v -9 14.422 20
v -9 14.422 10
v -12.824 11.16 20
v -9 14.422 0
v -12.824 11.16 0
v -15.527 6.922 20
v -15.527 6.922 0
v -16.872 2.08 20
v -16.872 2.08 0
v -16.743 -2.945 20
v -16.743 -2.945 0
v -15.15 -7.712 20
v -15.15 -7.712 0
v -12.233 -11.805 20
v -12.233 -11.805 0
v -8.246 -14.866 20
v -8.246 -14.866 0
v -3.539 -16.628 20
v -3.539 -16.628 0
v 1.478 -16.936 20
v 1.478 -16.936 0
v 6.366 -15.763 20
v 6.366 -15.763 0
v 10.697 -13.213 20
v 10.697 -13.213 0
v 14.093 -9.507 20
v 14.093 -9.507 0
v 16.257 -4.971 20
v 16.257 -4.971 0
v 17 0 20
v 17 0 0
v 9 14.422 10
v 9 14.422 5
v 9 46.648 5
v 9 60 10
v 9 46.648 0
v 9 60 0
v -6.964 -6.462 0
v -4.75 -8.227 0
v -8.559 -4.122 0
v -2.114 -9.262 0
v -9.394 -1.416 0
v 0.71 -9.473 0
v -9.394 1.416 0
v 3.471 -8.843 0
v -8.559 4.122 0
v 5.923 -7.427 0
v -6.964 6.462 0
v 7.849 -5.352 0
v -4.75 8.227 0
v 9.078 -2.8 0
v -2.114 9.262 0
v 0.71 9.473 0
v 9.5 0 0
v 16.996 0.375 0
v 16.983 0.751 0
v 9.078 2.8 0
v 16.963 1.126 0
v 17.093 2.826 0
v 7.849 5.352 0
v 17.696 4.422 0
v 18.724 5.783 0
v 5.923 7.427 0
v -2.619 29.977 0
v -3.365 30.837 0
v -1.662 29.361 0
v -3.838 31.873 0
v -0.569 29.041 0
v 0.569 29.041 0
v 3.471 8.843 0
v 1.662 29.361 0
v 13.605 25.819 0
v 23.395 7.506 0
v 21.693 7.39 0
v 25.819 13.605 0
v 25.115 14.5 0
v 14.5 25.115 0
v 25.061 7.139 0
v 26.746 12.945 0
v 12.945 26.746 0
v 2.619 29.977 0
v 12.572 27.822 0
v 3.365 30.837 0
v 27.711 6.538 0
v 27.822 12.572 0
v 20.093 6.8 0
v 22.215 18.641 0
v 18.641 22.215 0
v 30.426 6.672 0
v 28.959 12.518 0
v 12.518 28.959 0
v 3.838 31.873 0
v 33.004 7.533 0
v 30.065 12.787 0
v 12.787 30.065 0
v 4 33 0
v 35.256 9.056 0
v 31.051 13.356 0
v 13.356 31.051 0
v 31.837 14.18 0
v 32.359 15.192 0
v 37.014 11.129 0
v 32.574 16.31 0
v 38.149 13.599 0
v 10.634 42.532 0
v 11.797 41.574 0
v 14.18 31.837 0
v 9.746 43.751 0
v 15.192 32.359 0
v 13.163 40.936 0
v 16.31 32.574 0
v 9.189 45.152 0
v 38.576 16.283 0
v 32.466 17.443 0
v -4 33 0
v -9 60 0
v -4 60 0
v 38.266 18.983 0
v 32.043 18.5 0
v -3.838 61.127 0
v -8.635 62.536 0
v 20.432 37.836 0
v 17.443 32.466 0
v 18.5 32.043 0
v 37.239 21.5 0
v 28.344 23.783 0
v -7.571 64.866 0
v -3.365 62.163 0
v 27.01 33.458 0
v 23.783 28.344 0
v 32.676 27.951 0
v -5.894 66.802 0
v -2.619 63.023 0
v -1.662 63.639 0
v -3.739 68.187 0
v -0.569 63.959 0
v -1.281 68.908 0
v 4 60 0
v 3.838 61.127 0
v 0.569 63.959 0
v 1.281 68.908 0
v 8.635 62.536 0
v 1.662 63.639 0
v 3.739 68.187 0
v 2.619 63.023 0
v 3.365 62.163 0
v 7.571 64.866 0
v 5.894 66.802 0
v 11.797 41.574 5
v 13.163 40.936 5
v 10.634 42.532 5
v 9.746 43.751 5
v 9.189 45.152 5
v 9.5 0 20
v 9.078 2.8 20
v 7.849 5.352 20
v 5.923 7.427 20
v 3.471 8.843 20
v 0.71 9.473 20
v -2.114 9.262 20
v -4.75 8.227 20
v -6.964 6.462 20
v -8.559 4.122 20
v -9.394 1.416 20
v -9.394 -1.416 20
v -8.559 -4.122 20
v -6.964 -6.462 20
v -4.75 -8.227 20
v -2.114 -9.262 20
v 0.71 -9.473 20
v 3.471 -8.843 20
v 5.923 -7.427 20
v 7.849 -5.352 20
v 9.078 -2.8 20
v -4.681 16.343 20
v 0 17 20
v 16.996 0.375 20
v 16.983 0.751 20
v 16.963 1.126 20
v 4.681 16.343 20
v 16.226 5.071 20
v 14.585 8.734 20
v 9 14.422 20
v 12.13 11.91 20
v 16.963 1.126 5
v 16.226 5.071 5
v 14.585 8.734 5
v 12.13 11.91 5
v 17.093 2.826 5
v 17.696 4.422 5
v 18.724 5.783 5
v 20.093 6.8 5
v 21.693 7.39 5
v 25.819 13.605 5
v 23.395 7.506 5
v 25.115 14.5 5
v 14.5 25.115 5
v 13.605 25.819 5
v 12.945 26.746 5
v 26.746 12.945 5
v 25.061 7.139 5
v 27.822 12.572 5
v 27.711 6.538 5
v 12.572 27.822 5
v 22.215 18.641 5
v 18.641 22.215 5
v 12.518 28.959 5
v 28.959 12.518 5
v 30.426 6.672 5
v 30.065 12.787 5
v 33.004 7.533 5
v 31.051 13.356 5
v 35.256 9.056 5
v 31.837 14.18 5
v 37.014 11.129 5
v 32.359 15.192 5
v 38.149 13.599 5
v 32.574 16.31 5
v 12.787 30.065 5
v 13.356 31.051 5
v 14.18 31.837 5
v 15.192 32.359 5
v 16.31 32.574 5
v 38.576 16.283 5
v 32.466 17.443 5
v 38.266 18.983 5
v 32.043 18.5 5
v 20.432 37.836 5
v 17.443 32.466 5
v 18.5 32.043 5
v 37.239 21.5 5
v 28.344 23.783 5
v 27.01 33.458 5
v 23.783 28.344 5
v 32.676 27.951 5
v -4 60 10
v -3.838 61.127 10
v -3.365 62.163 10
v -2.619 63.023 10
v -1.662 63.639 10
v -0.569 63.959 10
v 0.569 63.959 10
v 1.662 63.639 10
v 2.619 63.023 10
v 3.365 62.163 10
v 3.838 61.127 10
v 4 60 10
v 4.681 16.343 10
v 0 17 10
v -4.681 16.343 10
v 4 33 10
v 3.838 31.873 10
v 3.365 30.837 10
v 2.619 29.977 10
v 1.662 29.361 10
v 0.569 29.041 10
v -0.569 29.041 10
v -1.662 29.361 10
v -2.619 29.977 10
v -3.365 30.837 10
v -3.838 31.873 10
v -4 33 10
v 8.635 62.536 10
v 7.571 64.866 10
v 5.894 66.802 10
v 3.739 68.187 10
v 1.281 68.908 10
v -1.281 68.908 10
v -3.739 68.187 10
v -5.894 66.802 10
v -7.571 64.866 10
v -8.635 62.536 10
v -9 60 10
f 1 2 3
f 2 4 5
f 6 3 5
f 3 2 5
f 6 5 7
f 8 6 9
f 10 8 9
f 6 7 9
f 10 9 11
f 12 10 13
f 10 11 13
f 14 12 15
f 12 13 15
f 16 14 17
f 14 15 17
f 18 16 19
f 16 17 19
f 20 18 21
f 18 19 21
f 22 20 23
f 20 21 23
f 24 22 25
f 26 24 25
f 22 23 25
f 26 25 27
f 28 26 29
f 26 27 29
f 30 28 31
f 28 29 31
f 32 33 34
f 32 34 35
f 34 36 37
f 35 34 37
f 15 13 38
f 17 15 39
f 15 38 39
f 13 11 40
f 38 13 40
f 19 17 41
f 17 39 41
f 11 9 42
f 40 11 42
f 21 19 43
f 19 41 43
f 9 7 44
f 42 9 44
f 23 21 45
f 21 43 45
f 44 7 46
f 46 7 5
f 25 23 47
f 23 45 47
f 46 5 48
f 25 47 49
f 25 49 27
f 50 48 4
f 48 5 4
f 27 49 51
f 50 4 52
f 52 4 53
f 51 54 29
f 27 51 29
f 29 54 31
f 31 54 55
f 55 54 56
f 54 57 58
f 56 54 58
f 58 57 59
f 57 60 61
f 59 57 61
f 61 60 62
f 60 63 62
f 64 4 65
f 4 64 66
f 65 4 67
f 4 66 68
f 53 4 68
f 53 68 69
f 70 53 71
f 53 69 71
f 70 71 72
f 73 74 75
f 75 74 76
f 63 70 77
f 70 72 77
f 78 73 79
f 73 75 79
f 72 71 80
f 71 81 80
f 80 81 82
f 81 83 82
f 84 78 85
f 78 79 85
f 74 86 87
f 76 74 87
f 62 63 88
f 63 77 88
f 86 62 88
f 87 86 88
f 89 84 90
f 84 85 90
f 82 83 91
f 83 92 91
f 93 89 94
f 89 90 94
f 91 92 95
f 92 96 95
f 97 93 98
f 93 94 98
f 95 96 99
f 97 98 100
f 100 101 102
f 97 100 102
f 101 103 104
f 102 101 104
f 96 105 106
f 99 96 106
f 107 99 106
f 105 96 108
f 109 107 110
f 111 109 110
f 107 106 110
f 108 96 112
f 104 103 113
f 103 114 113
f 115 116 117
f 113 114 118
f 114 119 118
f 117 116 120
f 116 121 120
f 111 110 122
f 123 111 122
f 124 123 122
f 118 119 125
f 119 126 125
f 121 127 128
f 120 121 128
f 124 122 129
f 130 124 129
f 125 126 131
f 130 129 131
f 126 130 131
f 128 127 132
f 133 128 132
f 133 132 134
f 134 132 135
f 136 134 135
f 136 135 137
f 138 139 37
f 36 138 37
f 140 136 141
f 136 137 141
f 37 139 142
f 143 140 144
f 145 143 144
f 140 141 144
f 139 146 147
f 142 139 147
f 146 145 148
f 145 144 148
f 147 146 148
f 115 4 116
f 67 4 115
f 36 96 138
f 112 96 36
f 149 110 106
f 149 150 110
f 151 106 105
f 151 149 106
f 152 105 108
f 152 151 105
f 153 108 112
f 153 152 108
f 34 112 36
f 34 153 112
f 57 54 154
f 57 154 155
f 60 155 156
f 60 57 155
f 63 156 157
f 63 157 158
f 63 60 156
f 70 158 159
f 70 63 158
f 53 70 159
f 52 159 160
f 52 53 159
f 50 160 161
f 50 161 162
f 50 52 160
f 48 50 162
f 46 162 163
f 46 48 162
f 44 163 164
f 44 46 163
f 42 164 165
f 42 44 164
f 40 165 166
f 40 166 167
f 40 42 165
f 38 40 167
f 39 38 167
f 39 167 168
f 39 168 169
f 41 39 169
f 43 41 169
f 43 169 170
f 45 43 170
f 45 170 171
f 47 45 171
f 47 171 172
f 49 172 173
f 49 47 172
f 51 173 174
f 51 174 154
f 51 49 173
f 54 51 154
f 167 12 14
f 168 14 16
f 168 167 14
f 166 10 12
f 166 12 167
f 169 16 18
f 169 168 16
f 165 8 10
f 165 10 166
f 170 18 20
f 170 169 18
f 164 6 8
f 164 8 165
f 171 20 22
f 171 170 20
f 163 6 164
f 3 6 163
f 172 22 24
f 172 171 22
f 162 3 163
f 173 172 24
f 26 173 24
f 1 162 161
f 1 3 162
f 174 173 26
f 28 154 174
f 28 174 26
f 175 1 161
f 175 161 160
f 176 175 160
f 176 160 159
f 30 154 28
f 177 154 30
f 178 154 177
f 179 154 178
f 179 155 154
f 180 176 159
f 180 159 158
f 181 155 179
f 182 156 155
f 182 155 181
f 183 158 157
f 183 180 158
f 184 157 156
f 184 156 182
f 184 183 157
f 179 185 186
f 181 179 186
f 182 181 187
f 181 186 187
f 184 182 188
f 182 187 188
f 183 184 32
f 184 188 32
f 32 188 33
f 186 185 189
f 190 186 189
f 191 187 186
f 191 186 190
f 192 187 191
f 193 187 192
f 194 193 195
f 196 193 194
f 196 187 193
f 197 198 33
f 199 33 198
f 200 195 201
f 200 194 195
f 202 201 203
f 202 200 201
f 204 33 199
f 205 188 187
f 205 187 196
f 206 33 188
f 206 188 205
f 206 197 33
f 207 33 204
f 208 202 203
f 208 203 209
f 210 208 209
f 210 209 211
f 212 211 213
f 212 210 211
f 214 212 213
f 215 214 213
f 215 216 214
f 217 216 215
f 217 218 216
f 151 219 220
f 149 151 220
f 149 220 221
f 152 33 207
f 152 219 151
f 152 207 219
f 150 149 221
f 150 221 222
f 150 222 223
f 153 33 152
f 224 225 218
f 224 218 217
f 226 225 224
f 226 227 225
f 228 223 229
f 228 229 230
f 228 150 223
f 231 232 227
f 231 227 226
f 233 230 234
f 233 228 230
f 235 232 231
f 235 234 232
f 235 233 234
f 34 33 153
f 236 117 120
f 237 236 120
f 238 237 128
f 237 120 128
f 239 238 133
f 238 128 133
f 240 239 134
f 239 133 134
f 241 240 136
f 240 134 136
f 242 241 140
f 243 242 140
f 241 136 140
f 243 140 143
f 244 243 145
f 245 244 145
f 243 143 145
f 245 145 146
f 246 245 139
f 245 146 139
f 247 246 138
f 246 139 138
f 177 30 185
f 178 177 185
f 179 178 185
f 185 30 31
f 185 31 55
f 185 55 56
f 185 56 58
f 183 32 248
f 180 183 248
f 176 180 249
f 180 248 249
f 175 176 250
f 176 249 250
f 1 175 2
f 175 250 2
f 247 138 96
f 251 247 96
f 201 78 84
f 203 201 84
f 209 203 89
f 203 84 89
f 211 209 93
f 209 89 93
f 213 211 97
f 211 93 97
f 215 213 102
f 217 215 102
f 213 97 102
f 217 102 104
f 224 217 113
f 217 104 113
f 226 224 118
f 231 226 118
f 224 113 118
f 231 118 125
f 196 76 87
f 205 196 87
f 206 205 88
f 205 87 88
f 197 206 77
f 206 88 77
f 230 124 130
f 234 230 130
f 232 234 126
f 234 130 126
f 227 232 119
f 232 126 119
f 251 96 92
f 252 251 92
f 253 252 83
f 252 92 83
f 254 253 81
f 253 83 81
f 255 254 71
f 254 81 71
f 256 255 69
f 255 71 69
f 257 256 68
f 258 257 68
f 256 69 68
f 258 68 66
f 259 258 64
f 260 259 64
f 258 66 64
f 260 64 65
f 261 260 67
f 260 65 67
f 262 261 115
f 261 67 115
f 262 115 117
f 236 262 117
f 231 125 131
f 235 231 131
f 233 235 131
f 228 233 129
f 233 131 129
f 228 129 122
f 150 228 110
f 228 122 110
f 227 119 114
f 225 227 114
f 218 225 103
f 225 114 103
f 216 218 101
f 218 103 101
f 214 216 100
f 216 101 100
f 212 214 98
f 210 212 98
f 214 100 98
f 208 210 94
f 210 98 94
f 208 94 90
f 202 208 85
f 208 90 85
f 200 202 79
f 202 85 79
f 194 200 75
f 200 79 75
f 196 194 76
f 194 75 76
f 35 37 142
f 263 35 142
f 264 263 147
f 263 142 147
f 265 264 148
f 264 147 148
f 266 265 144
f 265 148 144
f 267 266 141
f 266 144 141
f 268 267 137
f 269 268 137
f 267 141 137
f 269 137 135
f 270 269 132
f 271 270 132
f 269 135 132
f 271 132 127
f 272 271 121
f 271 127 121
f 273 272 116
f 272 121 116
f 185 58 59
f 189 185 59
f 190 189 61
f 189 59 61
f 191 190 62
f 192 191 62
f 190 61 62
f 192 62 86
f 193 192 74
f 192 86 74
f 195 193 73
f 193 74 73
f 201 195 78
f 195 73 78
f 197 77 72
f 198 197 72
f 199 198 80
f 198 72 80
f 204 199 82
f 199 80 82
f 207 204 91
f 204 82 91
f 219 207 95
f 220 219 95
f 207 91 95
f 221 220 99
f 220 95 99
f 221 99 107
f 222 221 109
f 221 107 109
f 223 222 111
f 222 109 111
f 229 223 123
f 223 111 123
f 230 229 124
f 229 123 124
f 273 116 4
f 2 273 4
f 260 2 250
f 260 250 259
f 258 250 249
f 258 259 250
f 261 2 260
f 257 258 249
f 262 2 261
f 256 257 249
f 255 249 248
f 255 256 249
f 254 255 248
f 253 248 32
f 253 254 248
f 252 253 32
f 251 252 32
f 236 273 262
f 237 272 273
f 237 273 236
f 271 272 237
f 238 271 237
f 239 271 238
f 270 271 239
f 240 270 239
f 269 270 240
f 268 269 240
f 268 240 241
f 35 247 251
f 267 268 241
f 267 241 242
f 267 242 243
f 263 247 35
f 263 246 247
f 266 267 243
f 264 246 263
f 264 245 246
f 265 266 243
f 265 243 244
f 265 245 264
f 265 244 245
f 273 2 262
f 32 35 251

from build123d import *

# Parameters (mm, degrees)
F1_DEPTH = 10
F0_R     = 9.5
F2_DEPTH = 20
F3_DEPTH = 5
F4_R     = 6


with BuildPart() as f1:
    # F0 (on Top) → F1 (new body)
    with BuildSketch(Plane.XY):
        with BuildLine():
            Line((-9, 60), (-9, 42.0475920833))
            ThreePointArc((-9, 42.0475920833), (-6.5112727326, 42.5041565897), (-4, 42.8135492572))
            Line((-4, 42.8135492572), (-4, 60))
            ThreePointArc((-4, 60), (0, 64), (4, 60))
            Line((4, 60), (4, 42.8135492572))
            ThreePointArc((4, 42.8135492572), (6.5112727326, 42.5041565897), (9, 42.0475920833))
            Line((9, 42.0475920833), (9, 60))
            ThreePointArc((9, 60), (0, 69), (-9, 60))
        make_face()
        with BuildLine():
            Line((-9, 42.0475920833), (-9, 14.4222051019))
            ThreePointArc((-9, 14.4222051019), (0, 17), (9, 14.4222051019))
            Line((9, 14.4222051019), (9, 42.0475920833))
            ThreePointArc((9, 42.0475920833), (6.5112727326, 42.5041565897), (4, 42.8135492572))
            Line((4, 42.8135492572), (4, 33))
            ThreePointArc((4, 33), (0, 29), (-4, 33))
            Line((-4, 33), (-4, 42.8135492572))
            ThreePointArc((-4, 42.8135492572), (-6.5112727326, 42.5041565897), (-9, 42.0475920833))
        make_face()
    extrude(amount=F1_DEPTH)

    # F0 (on Top) → F2 (join)
    with BuildSketch(Plane.XY):
        with BuildLine():
            ThreePointArc((-9, 14.4222051019), (-8.2462112512, -14.8660687473), (17, 0))
            ThreePointArc((17, 0), (16.9906697283, 0.5631537833), (16.9626891549, 1.1256894045))
            ThreePointArc((16.9626891549, 1.1256894045), (14.5847399518, 8.7341491022), (9, 14.4222051019))
            ThreePointArc((9, 14.4222051019), (0, 17), (-9, 14.4222051019))
        make_face()
        Circle(F0_R, mode=Mode.SUBTRACT)
    extrude(amount=F2_DEPTH)

    # F0 (on Top) → F3 (join)
    with BuildSketch(Plane.XY):
        with BuildLine():
            ThreePointArc((9, 14.4222051019), (14.5847399518, 8.7341491022), (16.9626891549, 1.1256894045))
            ThreePointArc((16.9626891549, 1.1256894045), (19.3722847508, 6.3399805993), (25.0605147601, 7.1393697171))
            ThreePointArc((25.0605147601, 7.1393697171), (36.2055537239, 10.0321400586), (37.2390923627, 21.5))
            ThreePointArc((37.2390923627, 21.5), (25.2994921043, 34.7697526489), (9, 42.0475920833))
            Line((9, 42.0475920833), (9, 14.4222051019))
        make_face()
        with BuildLine():
            ThreePointArc((32.04293994, 18.5), (30.5788383249, 13.0358983849), (25.1147367097, 14.5))
            ThreePointArc((25.1147367097, 14.5), (20.5060966544, 20.5060966544), (14.5, 25.1147367097))
            ThreePointArc((14.5, 25.1147367097), (13.0358983849, 30.5788383249), (18.5, 32.04293994))
            ThreePointArc((18.5, 32.04293994), (26.1629509039, 26.1629509039), (32.04293994, 18.5))
        make_face(mode=Mode.SUBTRACT)
    extrude(amount=F3_DEPTH)

    # F4
    f4_edges = [f1.edges().sort_by_distance(p)[0] for p in [
        (9, 42.047592, 2.5),
    ]]
    fillet(f4_edges, radius=F4_R)


solid = f1.part
